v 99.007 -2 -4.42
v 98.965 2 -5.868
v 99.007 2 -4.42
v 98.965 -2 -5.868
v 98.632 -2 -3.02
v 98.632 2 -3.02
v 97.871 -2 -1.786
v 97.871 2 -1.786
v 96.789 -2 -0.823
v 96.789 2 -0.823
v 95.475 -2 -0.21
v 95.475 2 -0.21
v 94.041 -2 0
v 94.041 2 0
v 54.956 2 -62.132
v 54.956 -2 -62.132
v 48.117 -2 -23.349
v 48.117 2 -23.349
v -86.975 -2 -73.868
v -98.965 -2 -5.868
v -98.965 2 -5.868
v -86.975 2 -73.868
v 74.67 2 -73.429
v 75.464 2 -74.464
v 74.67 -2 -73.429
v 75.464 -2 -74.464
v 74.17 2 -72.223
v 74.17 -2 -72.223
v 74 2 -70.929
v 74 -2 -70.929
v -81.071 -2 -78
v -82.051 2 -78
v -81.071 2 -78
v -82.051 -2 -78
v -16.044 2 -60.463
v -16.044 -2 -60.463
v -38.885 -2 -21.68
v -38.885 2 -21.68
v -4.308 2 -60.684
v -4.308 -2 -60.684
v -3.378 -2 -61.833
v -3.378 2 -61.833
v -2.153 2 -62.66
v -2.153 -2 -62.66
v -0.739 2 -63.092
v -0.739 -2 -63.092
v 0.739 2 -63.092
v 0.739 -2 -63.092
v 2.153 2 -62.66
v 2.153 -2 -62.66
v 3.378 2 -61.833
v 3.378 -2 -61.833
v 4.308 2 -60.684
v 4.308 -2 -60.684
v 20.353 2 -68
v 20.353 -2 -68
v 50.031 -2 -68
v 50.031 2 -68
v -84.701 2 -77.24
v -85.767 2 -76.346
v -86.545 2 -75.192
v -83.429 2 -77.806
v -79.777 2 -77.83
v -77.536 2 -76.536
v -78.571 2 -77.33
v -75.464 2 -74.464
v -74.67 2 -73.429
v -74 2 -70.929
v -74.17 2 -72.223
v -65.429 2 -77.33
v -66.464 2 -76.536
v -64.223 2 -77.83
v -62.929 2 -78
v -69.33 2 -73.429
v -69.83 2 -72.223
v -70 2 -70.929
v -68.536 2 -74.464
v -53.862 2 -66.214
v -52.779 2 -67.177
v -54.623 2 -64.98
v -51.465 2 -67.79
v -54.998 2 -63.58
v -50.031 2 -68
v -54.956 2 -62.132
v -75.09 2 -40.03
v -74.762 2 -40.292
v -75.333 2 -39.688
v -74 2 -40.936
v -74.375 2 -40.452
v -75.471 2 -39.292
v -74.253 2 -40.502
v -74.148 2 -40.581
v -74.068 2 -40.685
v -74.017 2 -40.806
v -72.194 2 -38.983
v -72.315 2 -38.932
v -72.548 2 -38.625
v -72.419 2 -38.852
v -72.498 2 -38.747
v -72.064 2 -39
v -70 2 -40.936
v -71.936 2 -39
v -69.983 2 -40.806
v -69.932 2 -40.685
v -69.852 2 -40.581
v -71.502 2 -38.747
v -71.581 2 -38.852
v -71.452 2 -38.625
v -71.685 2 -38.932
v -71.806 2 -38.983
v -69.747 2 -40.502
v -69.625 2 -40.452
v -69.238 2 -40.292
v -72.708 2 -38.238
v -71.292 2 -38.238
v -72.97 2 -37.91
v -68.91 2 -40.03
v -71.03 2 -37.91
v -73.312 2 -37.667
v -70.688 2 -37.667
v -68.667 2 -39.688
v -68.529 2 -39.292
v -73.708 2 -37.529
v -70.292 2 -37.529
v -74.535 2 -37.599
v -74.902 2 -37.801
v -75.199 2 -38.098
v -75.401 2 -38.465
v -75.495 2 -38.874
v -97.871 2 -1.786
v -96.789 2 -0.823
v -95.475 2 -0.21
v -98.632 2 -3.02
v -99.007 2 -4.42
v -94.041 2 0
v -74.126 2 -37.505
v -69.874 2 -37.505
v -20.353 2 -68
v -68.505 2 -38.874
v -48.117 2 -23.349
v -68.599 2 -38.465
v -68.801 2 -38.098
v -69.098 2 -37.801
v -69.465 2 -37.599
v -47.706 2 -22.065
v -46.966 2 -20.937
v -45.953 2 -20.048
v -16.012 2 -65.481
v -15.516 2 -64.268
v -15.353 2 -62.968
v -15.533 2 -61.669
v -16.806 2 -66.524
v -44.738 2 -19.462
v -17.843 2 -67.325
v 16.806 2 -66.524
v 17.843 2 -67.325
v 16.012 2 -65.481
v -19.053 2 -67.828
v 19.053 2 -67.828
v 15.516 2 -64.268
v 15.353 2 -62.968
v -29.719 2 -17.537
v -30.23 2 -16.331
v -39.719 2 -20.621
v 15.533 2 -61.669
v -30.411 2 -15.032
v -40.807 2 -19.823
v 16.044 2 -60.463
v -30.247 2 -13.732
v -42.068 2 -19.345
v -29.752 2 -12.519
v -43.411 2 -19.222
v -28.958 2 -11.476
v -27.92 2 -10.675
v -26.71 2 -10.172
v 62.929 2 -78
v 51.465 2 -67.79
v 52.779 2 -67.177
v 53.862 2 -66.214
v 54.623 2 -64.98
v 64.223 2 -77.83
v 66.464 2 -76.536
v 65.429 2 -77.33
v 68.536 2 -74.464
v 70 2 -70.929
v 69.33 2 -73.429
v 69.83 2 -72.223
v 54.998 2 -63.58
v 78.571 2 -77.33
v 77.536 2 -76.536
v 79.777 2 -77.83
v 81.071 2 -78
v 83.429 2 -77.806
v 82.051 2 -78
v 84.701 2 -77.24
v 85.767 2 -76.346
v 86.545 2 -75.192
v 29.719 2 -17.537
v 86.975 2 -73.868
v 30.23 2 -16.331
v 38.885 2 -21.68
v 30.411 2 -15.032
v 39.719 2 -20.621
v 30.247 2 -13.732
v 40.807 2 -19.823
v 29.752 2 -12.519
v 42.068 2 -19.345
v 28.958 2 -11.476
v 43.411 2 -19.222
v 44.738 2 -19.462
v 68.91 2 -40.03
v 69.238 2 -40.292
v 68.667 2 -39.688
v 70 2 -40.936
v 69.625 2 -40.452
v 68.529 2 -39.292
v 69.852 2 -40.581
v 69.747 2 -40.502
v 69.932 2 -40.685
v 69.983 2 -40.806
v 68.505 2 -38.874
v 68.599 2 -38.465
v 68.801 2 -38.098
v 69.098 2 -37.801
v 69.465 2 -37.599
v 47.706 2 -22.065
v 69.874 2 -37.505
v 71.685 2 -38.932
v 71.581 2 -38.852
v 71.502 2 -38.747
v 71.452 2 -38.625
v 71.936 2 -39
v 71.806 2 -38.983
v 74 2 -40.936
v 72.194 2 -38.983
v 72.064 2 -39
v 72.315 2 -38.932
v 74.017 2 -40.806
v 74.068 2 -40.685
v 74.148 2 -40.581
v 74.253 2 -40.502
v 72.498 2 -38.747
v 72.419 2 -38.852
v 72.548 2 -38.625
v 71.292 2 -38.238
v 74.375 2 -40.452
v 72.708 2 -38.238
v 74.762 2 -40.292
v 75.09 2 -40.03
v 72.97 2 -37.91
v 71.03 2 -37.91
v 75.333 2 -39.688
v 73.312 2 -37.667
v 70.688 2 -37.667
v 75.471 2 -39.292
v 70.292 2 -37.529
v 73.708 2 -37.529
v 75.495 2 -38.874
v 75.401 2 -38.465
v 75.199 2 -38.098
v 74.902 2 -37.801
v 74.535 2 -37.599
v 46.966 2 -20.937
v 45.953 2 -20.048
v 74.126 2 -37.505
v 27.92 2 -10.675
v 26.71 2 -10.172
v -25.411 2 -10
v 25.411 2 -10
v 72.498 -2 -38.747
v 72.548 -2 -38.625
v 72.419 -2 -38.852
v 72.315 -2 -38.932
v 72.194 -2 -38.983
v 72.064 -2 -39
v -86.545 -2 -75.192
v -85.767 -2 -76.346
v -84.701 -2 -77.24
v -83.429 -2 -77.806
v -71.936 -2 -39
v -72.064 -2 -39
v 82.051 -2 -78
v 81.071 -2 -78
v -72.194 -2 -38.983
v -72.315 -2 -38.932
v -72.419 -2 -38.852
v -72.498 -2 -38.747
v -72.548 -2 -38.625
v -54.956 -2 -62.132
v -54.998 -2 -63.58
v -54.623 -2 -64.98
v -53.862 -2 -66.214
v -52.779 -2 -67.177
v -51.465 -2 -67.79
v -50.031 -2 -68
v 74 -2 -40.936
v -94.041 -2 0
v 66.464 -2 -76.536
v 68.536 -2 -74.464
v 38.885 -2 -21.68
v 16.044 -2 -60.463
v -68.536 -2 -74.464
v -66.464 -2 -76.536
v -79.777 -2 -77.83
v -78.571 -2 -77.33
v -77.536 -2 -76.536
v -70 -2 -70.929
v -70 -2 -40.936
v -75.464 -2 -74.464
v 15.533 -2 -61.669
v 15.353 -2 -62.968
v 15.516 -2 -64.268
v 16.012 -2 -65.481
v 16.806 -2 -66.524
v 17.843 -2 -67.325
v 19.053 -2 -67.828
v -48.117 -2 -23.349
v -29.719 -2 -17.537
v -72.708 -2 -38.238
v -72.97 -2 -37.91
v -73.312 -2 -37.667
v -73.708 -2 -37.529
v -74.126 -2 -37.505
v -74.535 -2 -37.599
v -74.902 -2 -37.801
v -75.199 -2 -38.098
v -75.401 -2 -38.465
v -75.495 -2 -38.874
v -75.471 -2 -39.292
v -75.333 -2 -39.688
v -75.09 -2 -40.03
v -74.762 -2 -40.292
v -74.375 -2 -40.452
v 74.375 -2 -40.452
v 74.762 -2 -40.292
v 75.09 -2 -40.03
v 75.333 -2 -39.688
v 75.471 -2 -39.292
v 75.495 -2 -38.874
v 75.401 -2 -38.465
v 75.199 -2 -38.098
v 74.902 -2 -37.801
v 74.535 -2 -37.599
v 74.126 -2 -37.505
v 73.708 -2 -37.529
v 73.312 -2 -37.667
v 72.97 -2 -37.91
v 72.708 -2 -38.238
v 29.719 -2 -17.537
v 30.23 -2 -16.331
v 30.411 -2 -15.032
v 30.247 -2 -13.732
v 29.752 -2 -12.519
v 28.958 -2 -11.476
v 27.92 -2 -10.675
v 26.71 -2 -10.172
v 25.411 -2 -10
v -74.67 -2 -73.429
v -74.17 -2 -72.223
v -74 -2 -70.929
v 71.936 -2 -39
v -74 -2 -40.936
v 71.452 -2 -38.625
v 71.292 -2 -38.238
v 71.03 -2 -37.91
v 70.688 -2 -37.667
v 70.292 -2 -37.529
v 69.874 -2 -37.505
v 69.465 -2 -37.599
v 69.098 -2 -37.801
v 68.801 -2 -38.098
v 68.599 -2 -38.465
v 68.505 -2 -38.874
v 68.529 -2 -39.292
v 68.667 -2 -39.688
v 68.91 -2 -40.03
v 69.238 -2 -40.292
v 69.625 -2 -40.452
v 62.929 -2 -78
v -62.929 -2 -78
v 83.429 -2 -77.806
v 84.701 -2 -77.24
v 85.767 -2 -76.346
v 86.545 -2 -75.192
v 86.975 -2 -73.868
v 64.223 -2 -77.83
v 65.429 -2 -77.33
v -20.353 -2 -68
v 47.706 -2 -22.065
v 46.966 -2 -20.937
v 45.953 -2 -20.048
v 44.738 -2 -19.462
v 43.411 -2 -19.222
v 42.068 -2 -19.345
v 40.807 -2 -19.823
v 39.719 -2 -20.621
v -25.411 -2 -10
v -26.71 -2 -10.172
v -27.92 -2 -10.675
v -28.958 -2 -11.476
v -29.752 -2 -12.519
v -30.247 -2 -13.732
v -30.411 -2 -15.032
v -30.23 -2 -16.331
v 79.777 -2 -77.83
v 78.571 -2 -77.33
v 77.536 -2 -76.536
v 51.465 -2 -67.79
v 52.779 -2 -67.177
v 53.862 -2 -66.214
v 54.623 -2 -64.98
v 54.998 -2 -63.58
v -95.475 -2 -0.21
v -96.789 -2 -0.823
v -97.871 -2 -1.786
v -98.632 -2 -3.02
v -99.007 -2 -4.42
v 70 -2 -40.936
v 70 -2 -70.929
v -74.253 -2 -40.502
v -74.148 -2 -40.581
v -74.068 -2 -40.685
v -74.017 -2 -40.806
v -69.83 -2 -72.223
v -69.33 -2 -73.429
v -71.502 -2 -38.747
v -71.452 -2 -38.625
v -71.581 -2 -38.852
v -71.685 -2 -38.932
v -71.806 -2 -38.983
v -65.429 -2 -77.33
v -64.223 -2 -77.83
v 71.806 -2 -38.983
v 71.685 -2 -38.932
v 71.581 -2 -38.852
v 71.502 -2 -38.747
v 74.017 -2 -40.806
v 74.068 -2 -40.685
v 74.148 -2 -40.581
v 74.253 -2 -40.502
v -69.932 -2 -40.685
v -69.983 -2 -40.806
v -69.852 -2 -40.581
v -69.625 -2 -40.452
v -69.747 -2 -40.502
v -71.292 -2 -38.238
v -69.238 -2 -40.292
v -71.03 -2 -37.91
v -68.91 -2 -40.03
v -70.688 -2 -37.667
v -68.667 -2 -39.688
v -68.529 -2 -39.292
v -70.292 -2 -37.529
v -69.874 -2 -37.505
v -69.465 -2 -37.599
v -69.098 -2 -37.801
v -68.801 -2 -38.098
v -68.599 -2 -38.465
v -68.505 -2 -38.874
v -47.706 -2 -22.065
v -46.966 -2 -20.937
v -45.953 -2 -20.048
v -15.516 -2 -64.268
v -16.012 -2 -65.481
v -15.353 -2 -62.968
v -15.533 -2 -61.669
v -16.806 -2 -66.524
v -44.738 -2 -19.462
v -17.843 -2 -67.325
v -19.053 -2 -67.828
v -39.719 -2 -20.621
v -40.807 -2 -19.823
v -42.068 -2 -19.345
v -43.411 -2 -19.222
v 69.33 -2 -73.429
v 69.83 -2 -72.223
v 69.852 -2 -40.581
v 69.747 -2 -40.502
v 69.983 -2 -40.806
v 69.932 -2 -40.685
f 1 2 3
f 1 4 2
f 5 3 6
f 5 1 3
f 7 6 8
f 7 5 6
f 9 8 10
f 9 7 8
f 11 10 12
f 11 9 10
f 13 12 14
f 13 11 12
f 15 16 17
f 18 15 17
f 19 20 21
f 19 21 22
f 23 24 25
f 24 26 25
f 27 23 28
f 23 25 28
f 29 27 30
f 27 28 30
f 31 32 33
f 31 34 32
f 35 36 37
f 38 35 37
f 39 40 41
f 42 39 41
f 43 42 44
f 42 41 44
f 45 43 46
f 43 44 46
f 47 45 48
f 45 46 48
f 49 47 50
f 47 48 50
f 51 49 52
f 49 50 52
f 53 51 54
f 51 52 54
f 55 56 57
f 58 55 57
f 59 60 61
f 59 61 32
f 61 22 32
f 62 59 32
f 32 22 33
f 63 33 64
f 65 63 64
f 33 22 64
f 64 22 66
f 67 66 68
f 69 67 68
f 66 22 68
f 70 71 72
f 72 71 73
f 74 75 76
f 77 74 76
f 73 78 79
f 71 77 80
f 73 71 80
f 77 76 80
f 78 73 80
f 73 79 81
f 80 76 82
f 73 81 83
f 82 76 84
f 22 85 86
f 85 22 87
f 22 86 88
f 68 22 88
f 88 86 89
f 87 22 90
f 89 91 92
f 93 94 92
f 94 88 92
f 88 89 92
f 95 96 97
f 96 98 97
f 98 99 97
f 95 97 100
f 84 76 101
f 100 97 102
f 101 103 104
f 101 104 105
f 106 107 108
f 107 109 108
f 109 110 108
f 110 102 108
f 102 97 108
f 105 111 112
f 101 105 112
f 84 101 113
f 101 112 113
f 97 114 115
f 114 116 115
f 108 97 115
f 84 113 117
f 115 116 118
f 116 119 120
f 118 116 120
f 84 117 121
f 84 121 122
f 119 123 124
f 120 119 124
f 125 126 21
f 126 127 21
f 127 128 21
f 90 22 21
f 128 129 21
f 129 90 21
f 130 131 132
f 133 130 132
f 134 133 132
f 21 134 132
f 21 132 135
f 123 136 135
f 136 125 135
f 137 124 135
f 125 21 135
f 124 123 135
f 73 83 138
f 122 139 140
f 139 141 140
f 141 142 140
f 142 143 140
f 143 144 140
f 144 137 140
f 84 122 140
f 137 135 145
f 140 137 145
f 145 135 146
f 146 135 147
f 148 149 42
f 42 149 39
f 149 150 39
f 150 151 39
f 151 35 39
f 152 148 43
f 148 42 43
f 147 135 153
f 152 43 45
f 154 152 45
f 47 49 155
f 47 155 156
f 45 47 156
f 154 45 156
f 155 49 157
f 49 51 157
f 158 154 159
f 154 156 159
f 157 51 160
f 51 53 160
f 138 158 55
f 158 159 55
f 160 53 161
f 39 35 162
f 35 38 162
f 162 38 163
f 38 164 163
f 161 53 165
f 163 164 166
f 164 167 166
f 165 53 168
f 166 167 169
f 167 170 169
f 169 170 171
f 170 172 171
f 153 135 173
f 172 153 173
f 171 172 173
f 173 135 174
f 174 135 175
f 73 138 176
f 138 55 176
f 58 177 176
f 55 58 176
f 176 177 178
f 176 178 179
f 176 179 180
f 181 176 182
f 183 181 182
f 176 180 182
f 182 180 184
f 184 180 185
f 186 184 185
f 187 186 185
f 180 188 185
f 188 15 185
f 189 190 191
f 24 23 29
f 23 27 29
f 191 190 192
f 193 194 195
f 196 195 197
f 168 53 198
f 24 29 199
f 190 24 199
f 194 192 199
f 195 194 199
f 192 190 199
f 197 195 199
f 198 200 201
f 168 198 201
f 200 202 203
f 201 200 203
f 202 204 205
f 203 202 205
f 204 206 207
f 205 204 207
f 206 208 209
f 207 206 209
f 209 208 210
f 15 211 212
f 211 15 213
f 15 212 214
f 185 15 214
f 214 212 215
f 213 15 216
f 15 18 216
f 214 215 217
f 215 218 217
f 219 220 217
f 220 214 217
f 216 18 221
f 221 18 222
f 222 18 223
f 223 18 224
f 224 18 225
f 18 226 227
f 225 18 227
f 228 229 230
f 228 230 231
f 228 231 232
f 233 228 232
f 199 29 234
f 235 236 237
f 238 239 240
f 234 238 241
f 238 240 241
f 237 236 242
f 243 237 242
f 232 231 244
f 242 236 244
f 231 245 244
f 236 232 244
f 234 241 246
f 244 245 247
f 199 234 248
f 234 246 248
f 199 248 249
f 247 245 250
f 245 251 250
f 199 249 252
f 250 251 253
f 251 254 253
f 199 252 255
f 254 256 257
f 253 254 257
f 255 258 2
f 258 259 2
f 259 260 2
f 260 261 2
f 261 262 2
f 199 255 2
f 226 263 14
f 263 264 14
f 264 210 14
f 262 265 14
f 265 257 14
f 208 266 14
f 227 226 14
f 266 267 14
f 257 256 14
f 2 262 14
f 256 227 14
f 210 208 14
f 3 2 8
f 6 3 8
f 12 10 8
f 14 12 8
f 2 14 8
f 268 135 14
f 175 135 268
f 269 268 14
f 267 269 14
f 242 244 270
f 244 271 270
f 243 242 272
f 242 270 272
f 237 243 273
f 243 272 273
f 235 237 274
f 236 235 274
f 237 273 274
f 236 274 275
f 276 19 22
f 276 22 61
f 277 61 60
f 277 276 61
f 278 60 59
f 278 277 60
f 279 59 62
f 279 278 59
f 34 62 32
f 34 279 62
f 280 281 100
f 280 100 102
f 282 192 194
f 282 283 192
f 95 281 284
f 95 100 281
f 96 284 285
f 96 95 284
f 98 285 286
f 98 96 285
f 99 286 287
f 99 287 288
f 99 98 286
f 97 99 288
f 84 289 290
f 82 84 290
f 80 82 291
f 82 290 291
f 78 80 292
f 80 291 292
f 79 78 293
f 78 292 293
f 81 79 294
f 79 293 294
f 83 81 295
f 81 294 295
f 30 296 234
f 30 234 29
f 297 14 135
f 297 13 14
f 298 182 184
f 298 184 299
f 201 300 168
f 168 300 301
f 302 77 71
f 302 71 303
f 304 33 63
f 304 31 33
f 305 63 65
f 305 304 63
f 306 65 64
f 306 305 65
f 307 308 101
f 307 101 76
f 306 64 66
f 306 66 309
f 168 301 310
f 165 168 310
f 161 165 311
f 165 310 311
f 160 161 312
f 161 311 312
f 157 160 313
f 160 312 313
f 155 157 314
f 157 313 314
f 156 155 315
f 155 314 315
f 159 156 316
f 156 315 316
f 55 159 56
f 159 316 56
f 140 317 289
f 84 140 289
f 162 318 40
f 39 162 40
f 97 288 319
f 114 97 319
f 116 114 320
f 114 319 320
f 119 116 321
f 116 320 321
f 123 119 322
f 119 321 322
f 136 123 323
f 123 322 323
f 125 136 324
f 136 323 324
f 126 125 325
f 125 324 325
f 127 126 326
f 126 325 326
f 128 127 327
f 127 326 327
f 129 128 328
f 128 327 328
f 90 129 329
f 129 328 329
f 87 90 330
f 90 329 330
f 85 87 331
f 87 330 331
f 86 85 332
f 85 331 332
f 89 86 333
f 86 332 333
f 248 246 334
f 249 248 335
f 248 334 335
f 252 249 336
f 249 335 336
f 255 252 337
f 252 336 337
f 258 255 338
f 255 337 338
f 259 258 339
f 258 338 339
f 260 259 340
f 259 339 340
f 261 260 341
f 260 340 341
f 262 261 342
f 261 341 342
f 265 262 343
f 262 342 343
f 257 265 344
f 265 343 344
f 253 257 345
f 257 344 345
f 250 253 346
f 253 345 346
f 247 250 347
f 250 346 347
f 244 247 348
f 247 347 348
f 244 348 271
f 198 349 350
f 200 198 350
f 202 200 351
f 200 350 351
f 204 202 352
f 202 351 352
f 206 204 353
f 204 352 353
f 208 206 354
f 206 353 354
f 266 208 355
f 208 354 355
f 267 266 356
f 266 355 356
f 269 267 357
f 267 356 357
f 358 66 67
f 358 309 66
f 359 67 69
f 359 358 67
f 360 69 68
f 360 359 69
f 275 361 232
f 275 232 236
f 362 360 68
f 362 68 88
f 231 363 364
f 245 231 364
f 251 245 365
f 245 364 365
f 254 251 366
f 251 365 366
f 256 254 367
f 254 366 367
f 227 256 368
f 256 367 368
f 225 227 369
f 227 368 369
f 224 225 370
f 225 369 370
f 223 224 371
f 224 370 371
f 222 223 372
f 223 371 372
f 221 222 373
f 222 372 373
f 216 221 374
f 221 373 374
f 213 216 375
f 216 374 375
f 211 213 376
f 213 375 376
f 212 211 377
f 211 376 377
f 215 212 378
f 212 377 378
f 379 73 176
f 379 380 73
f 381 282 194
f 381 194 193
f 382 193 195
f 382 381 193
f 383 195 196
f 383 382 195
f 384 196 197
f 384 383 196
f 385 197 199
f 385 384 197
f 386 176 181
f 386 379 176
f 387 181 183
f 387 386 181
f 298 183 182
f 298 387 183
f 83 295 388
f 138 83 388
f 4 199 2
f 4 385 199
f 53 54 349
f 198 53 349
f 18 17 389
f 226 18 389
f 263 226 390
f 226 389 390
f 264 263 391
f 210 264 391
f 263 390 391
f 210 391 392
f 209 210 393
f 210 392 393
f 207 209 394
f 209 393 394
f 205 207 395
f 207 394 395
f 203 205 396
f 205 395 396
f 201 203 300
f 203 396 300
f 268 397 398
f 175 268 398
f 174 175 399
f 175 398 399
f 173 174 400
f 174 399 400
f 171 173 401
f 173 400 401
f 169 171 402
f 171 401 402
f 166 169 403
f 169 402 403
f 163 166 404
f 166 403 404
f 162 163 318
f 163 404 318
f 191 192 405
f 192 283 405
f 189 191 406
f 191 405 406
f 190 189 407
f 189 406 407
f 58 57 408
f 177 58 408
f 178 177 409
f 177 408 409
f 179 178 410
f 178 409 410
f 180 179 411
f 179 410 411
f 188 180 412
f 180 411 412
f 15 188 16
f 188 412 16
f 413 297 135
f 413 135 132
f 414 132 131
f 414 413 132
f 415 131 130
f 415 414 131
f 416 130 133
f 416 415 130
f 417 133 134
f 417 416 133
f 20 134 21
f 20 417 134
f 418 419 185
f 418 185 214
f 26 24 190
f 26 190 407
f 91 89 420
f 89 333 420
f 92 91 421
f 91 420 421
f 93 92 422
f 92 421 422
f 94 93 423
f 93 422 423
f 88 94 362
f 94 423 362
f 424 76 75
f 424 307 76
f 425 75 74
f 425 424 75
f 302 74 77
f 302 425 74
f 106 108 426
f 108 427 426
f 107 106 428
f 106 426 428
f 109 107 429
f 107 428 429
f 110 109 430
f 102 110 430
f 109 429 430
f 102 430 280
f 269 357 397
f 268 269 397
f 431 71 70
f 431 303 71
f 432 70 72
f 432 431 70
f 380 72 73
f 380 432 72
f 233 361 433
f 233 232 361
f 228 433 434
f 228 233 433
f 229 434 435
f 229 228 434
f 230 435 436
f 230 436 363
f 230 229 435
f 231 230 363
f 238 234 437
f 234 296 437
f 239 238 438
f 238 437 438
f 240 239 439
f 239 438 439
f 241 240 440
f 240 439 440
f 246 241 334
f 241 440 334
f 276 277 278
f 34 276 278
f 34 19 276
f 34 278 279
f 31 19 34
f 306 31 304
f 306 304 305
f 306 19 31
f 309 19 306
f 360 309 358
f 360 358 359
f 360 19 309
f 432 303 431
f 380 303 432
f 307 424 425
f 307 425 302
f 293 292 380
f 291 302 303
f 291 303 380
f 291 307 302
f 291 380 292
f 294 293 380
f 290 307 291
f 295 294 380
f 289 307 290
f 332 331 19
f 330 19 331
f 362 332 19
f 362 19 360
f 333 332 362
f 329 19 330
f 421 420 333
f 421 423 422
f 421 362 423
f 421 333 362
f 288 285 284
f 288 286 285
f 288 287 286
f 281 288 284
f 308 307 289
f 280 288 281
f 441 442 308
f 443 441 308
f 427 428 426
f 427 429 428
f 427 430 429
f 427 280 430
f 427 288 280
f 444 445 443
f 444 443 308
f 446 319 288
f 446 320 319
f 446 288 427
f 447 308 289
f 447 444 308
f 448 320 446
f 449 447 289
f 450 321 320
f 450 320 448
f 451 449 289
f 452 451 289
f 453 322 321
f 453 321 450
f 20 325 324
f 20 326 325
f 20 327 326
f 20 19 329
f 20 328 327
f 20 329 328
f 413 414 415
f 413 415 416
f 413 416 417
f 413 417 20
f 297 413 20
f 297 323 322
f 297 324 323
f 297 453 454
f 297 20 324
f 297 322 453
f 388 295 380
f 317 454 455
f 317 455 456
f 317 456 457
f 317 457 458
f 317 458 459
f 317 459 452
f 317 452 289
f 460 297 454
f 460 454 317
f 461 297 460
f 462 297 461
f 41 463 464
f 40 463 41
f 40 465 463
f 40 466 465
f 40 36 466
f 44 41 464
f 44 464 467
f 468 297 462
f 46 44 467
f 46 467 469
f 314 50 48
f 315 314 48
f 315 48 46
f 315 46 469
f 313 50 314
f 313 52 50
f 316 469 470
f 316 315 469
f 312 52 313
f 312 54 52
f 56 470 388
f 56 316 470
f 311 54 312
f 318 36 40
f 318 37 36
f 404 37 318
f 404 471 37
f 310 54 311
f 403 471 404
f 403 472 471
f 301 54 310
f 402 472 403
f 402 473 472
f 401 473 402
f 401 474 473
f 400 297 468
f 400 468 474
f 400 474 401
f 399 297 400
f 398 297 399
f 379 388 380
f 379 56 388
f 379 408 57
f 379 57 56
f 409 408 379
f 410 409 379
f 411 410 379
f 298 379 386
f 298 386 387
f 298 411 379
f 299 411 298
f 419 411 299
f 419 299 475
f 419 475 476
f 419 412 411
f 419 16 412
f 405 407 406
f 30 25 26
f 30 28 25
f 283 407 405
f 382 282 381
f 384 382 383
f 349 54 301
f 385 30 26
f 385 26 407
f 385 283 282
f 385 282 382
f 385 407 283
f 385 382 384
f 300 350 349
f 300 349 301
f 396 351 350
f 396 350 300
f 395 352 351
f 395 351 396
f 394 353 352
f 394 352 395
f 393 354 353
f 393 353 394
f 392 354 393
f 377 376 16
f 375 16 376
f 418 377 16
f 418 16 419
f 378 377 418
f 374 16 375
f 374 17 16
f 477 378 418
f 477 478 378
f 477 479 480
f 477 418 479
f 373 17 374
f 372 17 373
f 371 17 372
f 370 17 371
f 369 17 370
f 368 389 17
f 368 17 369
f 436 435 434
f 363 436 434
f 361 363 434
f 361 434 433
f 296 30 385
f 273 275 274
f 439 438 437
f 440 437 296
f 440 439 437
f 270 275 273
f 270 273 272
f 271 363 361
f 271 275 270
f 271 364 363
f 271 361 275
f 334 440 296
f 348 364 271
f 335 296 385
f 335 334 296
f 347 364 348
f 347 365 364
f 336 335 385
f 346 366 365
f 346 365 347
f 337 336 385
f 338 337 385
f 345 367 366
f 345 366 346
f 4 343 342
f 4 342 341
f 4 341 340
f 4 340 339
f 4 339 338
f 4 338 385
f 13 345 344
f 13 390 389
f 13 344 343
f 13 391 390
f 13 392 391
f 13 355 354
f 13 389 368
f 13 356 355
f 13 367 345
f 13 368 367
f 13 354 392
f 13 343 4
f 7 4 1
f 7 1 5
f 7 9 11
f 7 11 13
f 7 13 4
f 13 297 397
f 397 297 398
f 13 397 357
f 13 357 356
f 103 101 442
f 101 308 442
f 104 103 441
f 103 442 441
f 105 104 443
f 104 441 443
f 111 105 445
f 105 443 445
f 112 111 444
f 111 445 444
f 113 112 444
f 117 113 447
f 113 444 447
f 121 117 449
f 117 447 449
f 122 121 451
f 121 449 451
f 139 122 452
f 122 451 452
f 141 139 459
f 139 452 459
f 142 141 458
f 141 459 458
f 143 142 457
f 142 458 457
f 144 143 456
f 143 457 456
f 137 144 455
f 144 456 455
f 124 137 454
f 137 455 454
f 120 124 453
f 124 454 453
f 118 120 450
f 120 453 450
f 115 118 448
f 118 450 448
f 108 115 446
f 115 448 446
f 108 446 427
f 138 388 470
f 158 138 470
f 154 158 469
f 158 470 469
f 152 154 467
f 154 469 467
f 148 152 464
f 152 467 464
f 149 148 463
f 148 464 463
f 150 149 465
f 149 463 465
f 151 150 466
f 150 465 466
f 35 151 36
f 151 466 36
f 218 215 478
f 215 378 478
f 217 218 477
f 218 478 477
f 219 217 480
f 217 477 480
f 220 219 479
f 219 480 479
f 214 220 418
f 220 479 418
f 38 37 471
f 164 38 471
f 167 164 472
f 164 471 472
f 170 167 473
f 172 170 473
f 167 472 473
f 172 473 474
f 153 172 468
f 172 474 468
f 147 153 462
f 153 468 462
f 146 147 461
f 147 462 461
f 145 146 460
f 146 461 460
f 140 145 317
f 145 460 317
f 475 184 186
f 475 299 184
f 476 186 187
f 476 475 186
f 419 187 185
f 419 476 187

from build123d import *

# Parameters (mm, degrees)
F1_DEPTH = 2
F2_SIZE  = 5
F3_R     = 5
F4_R     = 1.5
F5_DEPTH = 4.001
F6_R     = 0.5
F8_DEPTH = 4.001


with BuildPart() as f1:
    # F0 (on Front) → F1 (new body, symmetric)
    with BuildSketch(Plane.XZ):
        with BuildLine():
            Line((94.041232037, 0), (-94.041232037, 0))
            ThreePointArc((-94.041232037, 0), (-97.8714542526, -1.7860619516), (-98.9652708021, -5.8682408883))
            Line((-98.9652708021, -5.8682408883), (-86.9750361139, -73.8682408883))
            ThreePointArc((-86.9750361139, -73.8682408883), (-85.2649353973, -76.8302222156), (-82.0509973489, -78))
            Line((-82.0509973489, -78), (-74, -78))
            Line((-74, -78), (-74, -39))
            Line((-74, -39), (-70, -39))
            Line((-70, -39), (-70, -78))
            Line((-70, -78), (70, -78))
            Line((70, -78), (70, -39))
            Line((70, -39), (74, -39))
            Line((74, -39), (74, -78))
            Line((74, -78), (82.0509973489, -78))
            ThreePointArc((82.0509973489, -78), (85.2649353973, -76.8302222156), (86.9750361139, -73.8682408883))
            Line((86.9750361139, -73.8682408883), (98.9652708021, -5.8682408883))
            ThreePointArc((98.9652708021, -5.8682408883), (97.8714542526, -1.7860619516), (94.041232037, 0))
        make_face()
    extrude(amount=F1_DEPTH, both=True)

    # F2
    f2_edges = [f1.edges().sort_by_distance(p)[0] for p in [
        (-74, 0, -78),
        (-70, 0, -78),
        (70, 0, -78),
        (74, 0, -78),
    ]]
    chamfer(f2_edges, length=F2_SIZE)

    # F3
    f3_edges = [f1.edges().sort_by_distance(p)[0] for p in [
        (74, 0, -73),
        (79, 0, -78),
        (70, 0, -73),
        (65, 0, -78),
        (-70, 0, -73),
        (-65, 0, -78),
        (-74, 0, -73),
        (-79, 0, -78),
    ]]
    fillet(f3_edges, radius=F3_R)

    # F4 (on face) → F5 (cut, through all)
    with BuildSketch(Plane.XZ.offset(2)):
        with Locations((74, -39)):
            Circle(F4_R)
        with Locations((70, -39)):
            Circle(F4_R)
        with Locations((-70, -39)):
            Circle(F4_R)
        with Locations((-74, -39)):
            Circle(F4_R)
    extrude(amount=-F5_DEPTH, mode=Mode.SUBTRACT)

    # F6
    f6_edges = [f1.edges().sort_by_distance(p)[0] for p in [
        (72.5, 0, -39),
        (74, 0, -40.5),
        (71.5, 0, -39),
        (70, 0, -40.5),
        (-74, 0, -40.5),
        (-72.5, 0, -39),
        (-71.5, 0, -39),
        (-70, 0, -40.5),
    ]]
    fillet(f6_edges, radius=F6_R)

    # F7 (on face) → F8 (cut, through all)
    with BuildSketch(Plane.XZ.offset(2)):
        with BuildLine():
            ThreePointArc((-38.884648043, -21.6798654453), (-44.0825181885, -19.2969474728), (-48.1170495204, -23.3489480955))
            Line((-48.1170495204, -23.3489480955), (-54.9555054903, -62.1317591117))
            ThreePointArc((-54.9555054903, -62.1317591117), (-53.8616889408, -66.2139380484), (-50.0314667252, -68))
            Line((-50.0314667252, -68), (-20.3526544878, -68))
            ThreePointArc((-20.3526544878, -68), (-16.0117664627, -65.4812680536), (-16.0442917755, -60.4626764615))
            Line((-16.0442917755, -60.4626764615), (-38.884648043, -21.6798654453))
        make_face()
        with BuildLine():
            ThreePointArc((-25.4106153193, -10), (-29.7515033444, -12.5187319464), (-29.7189780316, -17.5373235385))
            Line((-29.7189780316, -17.5373235385), (-4.3083627123, -60.6844216043))
            ThreePointArc((-4.3083627123, -60.6844216043), (0, -63.1470980658), (4.3083627123, -60.6844216043))
            Line((4.3083627123, -60.6844216043), (29.7189780316, -17.5373235385))
            ThreePointArc((29.7189780316, -17.5373235385), (29.7515033444, -12.5187319464), (25.4106153193, -10))
            Line((25.4106153193, -10), (-25.4106153193, -10))
        make_face()
        with BuildLine():
            ThreePointArc((50.0314667252, -68), (53.8616889408, -66.2139380484), (54.9555054903, -62.1317591117))
            Line((54.9555054903, -62.1317591117), (48.1170495204, -23.3489480955))
            ThreePointArc((48.1170495204, -23.3489480955), (44.0825181885, -19.2969474728), (38.884648043, -21.6798654453))
            Line((38.884648043, -21.6798654453), (16.0442917755, -60.4626764615))
            ThreePointArc((16.0442917755, -60.4626764615), (16.0117664627, -65.4812680536), (20.3526544878, -68))
            Line((20.3526544878, -68), (50.0314667252, -68))
        make_face()
    extrude(amount=-F8_DEPTH, mode=Mode.SUBTRACT)


solid = f1.part
